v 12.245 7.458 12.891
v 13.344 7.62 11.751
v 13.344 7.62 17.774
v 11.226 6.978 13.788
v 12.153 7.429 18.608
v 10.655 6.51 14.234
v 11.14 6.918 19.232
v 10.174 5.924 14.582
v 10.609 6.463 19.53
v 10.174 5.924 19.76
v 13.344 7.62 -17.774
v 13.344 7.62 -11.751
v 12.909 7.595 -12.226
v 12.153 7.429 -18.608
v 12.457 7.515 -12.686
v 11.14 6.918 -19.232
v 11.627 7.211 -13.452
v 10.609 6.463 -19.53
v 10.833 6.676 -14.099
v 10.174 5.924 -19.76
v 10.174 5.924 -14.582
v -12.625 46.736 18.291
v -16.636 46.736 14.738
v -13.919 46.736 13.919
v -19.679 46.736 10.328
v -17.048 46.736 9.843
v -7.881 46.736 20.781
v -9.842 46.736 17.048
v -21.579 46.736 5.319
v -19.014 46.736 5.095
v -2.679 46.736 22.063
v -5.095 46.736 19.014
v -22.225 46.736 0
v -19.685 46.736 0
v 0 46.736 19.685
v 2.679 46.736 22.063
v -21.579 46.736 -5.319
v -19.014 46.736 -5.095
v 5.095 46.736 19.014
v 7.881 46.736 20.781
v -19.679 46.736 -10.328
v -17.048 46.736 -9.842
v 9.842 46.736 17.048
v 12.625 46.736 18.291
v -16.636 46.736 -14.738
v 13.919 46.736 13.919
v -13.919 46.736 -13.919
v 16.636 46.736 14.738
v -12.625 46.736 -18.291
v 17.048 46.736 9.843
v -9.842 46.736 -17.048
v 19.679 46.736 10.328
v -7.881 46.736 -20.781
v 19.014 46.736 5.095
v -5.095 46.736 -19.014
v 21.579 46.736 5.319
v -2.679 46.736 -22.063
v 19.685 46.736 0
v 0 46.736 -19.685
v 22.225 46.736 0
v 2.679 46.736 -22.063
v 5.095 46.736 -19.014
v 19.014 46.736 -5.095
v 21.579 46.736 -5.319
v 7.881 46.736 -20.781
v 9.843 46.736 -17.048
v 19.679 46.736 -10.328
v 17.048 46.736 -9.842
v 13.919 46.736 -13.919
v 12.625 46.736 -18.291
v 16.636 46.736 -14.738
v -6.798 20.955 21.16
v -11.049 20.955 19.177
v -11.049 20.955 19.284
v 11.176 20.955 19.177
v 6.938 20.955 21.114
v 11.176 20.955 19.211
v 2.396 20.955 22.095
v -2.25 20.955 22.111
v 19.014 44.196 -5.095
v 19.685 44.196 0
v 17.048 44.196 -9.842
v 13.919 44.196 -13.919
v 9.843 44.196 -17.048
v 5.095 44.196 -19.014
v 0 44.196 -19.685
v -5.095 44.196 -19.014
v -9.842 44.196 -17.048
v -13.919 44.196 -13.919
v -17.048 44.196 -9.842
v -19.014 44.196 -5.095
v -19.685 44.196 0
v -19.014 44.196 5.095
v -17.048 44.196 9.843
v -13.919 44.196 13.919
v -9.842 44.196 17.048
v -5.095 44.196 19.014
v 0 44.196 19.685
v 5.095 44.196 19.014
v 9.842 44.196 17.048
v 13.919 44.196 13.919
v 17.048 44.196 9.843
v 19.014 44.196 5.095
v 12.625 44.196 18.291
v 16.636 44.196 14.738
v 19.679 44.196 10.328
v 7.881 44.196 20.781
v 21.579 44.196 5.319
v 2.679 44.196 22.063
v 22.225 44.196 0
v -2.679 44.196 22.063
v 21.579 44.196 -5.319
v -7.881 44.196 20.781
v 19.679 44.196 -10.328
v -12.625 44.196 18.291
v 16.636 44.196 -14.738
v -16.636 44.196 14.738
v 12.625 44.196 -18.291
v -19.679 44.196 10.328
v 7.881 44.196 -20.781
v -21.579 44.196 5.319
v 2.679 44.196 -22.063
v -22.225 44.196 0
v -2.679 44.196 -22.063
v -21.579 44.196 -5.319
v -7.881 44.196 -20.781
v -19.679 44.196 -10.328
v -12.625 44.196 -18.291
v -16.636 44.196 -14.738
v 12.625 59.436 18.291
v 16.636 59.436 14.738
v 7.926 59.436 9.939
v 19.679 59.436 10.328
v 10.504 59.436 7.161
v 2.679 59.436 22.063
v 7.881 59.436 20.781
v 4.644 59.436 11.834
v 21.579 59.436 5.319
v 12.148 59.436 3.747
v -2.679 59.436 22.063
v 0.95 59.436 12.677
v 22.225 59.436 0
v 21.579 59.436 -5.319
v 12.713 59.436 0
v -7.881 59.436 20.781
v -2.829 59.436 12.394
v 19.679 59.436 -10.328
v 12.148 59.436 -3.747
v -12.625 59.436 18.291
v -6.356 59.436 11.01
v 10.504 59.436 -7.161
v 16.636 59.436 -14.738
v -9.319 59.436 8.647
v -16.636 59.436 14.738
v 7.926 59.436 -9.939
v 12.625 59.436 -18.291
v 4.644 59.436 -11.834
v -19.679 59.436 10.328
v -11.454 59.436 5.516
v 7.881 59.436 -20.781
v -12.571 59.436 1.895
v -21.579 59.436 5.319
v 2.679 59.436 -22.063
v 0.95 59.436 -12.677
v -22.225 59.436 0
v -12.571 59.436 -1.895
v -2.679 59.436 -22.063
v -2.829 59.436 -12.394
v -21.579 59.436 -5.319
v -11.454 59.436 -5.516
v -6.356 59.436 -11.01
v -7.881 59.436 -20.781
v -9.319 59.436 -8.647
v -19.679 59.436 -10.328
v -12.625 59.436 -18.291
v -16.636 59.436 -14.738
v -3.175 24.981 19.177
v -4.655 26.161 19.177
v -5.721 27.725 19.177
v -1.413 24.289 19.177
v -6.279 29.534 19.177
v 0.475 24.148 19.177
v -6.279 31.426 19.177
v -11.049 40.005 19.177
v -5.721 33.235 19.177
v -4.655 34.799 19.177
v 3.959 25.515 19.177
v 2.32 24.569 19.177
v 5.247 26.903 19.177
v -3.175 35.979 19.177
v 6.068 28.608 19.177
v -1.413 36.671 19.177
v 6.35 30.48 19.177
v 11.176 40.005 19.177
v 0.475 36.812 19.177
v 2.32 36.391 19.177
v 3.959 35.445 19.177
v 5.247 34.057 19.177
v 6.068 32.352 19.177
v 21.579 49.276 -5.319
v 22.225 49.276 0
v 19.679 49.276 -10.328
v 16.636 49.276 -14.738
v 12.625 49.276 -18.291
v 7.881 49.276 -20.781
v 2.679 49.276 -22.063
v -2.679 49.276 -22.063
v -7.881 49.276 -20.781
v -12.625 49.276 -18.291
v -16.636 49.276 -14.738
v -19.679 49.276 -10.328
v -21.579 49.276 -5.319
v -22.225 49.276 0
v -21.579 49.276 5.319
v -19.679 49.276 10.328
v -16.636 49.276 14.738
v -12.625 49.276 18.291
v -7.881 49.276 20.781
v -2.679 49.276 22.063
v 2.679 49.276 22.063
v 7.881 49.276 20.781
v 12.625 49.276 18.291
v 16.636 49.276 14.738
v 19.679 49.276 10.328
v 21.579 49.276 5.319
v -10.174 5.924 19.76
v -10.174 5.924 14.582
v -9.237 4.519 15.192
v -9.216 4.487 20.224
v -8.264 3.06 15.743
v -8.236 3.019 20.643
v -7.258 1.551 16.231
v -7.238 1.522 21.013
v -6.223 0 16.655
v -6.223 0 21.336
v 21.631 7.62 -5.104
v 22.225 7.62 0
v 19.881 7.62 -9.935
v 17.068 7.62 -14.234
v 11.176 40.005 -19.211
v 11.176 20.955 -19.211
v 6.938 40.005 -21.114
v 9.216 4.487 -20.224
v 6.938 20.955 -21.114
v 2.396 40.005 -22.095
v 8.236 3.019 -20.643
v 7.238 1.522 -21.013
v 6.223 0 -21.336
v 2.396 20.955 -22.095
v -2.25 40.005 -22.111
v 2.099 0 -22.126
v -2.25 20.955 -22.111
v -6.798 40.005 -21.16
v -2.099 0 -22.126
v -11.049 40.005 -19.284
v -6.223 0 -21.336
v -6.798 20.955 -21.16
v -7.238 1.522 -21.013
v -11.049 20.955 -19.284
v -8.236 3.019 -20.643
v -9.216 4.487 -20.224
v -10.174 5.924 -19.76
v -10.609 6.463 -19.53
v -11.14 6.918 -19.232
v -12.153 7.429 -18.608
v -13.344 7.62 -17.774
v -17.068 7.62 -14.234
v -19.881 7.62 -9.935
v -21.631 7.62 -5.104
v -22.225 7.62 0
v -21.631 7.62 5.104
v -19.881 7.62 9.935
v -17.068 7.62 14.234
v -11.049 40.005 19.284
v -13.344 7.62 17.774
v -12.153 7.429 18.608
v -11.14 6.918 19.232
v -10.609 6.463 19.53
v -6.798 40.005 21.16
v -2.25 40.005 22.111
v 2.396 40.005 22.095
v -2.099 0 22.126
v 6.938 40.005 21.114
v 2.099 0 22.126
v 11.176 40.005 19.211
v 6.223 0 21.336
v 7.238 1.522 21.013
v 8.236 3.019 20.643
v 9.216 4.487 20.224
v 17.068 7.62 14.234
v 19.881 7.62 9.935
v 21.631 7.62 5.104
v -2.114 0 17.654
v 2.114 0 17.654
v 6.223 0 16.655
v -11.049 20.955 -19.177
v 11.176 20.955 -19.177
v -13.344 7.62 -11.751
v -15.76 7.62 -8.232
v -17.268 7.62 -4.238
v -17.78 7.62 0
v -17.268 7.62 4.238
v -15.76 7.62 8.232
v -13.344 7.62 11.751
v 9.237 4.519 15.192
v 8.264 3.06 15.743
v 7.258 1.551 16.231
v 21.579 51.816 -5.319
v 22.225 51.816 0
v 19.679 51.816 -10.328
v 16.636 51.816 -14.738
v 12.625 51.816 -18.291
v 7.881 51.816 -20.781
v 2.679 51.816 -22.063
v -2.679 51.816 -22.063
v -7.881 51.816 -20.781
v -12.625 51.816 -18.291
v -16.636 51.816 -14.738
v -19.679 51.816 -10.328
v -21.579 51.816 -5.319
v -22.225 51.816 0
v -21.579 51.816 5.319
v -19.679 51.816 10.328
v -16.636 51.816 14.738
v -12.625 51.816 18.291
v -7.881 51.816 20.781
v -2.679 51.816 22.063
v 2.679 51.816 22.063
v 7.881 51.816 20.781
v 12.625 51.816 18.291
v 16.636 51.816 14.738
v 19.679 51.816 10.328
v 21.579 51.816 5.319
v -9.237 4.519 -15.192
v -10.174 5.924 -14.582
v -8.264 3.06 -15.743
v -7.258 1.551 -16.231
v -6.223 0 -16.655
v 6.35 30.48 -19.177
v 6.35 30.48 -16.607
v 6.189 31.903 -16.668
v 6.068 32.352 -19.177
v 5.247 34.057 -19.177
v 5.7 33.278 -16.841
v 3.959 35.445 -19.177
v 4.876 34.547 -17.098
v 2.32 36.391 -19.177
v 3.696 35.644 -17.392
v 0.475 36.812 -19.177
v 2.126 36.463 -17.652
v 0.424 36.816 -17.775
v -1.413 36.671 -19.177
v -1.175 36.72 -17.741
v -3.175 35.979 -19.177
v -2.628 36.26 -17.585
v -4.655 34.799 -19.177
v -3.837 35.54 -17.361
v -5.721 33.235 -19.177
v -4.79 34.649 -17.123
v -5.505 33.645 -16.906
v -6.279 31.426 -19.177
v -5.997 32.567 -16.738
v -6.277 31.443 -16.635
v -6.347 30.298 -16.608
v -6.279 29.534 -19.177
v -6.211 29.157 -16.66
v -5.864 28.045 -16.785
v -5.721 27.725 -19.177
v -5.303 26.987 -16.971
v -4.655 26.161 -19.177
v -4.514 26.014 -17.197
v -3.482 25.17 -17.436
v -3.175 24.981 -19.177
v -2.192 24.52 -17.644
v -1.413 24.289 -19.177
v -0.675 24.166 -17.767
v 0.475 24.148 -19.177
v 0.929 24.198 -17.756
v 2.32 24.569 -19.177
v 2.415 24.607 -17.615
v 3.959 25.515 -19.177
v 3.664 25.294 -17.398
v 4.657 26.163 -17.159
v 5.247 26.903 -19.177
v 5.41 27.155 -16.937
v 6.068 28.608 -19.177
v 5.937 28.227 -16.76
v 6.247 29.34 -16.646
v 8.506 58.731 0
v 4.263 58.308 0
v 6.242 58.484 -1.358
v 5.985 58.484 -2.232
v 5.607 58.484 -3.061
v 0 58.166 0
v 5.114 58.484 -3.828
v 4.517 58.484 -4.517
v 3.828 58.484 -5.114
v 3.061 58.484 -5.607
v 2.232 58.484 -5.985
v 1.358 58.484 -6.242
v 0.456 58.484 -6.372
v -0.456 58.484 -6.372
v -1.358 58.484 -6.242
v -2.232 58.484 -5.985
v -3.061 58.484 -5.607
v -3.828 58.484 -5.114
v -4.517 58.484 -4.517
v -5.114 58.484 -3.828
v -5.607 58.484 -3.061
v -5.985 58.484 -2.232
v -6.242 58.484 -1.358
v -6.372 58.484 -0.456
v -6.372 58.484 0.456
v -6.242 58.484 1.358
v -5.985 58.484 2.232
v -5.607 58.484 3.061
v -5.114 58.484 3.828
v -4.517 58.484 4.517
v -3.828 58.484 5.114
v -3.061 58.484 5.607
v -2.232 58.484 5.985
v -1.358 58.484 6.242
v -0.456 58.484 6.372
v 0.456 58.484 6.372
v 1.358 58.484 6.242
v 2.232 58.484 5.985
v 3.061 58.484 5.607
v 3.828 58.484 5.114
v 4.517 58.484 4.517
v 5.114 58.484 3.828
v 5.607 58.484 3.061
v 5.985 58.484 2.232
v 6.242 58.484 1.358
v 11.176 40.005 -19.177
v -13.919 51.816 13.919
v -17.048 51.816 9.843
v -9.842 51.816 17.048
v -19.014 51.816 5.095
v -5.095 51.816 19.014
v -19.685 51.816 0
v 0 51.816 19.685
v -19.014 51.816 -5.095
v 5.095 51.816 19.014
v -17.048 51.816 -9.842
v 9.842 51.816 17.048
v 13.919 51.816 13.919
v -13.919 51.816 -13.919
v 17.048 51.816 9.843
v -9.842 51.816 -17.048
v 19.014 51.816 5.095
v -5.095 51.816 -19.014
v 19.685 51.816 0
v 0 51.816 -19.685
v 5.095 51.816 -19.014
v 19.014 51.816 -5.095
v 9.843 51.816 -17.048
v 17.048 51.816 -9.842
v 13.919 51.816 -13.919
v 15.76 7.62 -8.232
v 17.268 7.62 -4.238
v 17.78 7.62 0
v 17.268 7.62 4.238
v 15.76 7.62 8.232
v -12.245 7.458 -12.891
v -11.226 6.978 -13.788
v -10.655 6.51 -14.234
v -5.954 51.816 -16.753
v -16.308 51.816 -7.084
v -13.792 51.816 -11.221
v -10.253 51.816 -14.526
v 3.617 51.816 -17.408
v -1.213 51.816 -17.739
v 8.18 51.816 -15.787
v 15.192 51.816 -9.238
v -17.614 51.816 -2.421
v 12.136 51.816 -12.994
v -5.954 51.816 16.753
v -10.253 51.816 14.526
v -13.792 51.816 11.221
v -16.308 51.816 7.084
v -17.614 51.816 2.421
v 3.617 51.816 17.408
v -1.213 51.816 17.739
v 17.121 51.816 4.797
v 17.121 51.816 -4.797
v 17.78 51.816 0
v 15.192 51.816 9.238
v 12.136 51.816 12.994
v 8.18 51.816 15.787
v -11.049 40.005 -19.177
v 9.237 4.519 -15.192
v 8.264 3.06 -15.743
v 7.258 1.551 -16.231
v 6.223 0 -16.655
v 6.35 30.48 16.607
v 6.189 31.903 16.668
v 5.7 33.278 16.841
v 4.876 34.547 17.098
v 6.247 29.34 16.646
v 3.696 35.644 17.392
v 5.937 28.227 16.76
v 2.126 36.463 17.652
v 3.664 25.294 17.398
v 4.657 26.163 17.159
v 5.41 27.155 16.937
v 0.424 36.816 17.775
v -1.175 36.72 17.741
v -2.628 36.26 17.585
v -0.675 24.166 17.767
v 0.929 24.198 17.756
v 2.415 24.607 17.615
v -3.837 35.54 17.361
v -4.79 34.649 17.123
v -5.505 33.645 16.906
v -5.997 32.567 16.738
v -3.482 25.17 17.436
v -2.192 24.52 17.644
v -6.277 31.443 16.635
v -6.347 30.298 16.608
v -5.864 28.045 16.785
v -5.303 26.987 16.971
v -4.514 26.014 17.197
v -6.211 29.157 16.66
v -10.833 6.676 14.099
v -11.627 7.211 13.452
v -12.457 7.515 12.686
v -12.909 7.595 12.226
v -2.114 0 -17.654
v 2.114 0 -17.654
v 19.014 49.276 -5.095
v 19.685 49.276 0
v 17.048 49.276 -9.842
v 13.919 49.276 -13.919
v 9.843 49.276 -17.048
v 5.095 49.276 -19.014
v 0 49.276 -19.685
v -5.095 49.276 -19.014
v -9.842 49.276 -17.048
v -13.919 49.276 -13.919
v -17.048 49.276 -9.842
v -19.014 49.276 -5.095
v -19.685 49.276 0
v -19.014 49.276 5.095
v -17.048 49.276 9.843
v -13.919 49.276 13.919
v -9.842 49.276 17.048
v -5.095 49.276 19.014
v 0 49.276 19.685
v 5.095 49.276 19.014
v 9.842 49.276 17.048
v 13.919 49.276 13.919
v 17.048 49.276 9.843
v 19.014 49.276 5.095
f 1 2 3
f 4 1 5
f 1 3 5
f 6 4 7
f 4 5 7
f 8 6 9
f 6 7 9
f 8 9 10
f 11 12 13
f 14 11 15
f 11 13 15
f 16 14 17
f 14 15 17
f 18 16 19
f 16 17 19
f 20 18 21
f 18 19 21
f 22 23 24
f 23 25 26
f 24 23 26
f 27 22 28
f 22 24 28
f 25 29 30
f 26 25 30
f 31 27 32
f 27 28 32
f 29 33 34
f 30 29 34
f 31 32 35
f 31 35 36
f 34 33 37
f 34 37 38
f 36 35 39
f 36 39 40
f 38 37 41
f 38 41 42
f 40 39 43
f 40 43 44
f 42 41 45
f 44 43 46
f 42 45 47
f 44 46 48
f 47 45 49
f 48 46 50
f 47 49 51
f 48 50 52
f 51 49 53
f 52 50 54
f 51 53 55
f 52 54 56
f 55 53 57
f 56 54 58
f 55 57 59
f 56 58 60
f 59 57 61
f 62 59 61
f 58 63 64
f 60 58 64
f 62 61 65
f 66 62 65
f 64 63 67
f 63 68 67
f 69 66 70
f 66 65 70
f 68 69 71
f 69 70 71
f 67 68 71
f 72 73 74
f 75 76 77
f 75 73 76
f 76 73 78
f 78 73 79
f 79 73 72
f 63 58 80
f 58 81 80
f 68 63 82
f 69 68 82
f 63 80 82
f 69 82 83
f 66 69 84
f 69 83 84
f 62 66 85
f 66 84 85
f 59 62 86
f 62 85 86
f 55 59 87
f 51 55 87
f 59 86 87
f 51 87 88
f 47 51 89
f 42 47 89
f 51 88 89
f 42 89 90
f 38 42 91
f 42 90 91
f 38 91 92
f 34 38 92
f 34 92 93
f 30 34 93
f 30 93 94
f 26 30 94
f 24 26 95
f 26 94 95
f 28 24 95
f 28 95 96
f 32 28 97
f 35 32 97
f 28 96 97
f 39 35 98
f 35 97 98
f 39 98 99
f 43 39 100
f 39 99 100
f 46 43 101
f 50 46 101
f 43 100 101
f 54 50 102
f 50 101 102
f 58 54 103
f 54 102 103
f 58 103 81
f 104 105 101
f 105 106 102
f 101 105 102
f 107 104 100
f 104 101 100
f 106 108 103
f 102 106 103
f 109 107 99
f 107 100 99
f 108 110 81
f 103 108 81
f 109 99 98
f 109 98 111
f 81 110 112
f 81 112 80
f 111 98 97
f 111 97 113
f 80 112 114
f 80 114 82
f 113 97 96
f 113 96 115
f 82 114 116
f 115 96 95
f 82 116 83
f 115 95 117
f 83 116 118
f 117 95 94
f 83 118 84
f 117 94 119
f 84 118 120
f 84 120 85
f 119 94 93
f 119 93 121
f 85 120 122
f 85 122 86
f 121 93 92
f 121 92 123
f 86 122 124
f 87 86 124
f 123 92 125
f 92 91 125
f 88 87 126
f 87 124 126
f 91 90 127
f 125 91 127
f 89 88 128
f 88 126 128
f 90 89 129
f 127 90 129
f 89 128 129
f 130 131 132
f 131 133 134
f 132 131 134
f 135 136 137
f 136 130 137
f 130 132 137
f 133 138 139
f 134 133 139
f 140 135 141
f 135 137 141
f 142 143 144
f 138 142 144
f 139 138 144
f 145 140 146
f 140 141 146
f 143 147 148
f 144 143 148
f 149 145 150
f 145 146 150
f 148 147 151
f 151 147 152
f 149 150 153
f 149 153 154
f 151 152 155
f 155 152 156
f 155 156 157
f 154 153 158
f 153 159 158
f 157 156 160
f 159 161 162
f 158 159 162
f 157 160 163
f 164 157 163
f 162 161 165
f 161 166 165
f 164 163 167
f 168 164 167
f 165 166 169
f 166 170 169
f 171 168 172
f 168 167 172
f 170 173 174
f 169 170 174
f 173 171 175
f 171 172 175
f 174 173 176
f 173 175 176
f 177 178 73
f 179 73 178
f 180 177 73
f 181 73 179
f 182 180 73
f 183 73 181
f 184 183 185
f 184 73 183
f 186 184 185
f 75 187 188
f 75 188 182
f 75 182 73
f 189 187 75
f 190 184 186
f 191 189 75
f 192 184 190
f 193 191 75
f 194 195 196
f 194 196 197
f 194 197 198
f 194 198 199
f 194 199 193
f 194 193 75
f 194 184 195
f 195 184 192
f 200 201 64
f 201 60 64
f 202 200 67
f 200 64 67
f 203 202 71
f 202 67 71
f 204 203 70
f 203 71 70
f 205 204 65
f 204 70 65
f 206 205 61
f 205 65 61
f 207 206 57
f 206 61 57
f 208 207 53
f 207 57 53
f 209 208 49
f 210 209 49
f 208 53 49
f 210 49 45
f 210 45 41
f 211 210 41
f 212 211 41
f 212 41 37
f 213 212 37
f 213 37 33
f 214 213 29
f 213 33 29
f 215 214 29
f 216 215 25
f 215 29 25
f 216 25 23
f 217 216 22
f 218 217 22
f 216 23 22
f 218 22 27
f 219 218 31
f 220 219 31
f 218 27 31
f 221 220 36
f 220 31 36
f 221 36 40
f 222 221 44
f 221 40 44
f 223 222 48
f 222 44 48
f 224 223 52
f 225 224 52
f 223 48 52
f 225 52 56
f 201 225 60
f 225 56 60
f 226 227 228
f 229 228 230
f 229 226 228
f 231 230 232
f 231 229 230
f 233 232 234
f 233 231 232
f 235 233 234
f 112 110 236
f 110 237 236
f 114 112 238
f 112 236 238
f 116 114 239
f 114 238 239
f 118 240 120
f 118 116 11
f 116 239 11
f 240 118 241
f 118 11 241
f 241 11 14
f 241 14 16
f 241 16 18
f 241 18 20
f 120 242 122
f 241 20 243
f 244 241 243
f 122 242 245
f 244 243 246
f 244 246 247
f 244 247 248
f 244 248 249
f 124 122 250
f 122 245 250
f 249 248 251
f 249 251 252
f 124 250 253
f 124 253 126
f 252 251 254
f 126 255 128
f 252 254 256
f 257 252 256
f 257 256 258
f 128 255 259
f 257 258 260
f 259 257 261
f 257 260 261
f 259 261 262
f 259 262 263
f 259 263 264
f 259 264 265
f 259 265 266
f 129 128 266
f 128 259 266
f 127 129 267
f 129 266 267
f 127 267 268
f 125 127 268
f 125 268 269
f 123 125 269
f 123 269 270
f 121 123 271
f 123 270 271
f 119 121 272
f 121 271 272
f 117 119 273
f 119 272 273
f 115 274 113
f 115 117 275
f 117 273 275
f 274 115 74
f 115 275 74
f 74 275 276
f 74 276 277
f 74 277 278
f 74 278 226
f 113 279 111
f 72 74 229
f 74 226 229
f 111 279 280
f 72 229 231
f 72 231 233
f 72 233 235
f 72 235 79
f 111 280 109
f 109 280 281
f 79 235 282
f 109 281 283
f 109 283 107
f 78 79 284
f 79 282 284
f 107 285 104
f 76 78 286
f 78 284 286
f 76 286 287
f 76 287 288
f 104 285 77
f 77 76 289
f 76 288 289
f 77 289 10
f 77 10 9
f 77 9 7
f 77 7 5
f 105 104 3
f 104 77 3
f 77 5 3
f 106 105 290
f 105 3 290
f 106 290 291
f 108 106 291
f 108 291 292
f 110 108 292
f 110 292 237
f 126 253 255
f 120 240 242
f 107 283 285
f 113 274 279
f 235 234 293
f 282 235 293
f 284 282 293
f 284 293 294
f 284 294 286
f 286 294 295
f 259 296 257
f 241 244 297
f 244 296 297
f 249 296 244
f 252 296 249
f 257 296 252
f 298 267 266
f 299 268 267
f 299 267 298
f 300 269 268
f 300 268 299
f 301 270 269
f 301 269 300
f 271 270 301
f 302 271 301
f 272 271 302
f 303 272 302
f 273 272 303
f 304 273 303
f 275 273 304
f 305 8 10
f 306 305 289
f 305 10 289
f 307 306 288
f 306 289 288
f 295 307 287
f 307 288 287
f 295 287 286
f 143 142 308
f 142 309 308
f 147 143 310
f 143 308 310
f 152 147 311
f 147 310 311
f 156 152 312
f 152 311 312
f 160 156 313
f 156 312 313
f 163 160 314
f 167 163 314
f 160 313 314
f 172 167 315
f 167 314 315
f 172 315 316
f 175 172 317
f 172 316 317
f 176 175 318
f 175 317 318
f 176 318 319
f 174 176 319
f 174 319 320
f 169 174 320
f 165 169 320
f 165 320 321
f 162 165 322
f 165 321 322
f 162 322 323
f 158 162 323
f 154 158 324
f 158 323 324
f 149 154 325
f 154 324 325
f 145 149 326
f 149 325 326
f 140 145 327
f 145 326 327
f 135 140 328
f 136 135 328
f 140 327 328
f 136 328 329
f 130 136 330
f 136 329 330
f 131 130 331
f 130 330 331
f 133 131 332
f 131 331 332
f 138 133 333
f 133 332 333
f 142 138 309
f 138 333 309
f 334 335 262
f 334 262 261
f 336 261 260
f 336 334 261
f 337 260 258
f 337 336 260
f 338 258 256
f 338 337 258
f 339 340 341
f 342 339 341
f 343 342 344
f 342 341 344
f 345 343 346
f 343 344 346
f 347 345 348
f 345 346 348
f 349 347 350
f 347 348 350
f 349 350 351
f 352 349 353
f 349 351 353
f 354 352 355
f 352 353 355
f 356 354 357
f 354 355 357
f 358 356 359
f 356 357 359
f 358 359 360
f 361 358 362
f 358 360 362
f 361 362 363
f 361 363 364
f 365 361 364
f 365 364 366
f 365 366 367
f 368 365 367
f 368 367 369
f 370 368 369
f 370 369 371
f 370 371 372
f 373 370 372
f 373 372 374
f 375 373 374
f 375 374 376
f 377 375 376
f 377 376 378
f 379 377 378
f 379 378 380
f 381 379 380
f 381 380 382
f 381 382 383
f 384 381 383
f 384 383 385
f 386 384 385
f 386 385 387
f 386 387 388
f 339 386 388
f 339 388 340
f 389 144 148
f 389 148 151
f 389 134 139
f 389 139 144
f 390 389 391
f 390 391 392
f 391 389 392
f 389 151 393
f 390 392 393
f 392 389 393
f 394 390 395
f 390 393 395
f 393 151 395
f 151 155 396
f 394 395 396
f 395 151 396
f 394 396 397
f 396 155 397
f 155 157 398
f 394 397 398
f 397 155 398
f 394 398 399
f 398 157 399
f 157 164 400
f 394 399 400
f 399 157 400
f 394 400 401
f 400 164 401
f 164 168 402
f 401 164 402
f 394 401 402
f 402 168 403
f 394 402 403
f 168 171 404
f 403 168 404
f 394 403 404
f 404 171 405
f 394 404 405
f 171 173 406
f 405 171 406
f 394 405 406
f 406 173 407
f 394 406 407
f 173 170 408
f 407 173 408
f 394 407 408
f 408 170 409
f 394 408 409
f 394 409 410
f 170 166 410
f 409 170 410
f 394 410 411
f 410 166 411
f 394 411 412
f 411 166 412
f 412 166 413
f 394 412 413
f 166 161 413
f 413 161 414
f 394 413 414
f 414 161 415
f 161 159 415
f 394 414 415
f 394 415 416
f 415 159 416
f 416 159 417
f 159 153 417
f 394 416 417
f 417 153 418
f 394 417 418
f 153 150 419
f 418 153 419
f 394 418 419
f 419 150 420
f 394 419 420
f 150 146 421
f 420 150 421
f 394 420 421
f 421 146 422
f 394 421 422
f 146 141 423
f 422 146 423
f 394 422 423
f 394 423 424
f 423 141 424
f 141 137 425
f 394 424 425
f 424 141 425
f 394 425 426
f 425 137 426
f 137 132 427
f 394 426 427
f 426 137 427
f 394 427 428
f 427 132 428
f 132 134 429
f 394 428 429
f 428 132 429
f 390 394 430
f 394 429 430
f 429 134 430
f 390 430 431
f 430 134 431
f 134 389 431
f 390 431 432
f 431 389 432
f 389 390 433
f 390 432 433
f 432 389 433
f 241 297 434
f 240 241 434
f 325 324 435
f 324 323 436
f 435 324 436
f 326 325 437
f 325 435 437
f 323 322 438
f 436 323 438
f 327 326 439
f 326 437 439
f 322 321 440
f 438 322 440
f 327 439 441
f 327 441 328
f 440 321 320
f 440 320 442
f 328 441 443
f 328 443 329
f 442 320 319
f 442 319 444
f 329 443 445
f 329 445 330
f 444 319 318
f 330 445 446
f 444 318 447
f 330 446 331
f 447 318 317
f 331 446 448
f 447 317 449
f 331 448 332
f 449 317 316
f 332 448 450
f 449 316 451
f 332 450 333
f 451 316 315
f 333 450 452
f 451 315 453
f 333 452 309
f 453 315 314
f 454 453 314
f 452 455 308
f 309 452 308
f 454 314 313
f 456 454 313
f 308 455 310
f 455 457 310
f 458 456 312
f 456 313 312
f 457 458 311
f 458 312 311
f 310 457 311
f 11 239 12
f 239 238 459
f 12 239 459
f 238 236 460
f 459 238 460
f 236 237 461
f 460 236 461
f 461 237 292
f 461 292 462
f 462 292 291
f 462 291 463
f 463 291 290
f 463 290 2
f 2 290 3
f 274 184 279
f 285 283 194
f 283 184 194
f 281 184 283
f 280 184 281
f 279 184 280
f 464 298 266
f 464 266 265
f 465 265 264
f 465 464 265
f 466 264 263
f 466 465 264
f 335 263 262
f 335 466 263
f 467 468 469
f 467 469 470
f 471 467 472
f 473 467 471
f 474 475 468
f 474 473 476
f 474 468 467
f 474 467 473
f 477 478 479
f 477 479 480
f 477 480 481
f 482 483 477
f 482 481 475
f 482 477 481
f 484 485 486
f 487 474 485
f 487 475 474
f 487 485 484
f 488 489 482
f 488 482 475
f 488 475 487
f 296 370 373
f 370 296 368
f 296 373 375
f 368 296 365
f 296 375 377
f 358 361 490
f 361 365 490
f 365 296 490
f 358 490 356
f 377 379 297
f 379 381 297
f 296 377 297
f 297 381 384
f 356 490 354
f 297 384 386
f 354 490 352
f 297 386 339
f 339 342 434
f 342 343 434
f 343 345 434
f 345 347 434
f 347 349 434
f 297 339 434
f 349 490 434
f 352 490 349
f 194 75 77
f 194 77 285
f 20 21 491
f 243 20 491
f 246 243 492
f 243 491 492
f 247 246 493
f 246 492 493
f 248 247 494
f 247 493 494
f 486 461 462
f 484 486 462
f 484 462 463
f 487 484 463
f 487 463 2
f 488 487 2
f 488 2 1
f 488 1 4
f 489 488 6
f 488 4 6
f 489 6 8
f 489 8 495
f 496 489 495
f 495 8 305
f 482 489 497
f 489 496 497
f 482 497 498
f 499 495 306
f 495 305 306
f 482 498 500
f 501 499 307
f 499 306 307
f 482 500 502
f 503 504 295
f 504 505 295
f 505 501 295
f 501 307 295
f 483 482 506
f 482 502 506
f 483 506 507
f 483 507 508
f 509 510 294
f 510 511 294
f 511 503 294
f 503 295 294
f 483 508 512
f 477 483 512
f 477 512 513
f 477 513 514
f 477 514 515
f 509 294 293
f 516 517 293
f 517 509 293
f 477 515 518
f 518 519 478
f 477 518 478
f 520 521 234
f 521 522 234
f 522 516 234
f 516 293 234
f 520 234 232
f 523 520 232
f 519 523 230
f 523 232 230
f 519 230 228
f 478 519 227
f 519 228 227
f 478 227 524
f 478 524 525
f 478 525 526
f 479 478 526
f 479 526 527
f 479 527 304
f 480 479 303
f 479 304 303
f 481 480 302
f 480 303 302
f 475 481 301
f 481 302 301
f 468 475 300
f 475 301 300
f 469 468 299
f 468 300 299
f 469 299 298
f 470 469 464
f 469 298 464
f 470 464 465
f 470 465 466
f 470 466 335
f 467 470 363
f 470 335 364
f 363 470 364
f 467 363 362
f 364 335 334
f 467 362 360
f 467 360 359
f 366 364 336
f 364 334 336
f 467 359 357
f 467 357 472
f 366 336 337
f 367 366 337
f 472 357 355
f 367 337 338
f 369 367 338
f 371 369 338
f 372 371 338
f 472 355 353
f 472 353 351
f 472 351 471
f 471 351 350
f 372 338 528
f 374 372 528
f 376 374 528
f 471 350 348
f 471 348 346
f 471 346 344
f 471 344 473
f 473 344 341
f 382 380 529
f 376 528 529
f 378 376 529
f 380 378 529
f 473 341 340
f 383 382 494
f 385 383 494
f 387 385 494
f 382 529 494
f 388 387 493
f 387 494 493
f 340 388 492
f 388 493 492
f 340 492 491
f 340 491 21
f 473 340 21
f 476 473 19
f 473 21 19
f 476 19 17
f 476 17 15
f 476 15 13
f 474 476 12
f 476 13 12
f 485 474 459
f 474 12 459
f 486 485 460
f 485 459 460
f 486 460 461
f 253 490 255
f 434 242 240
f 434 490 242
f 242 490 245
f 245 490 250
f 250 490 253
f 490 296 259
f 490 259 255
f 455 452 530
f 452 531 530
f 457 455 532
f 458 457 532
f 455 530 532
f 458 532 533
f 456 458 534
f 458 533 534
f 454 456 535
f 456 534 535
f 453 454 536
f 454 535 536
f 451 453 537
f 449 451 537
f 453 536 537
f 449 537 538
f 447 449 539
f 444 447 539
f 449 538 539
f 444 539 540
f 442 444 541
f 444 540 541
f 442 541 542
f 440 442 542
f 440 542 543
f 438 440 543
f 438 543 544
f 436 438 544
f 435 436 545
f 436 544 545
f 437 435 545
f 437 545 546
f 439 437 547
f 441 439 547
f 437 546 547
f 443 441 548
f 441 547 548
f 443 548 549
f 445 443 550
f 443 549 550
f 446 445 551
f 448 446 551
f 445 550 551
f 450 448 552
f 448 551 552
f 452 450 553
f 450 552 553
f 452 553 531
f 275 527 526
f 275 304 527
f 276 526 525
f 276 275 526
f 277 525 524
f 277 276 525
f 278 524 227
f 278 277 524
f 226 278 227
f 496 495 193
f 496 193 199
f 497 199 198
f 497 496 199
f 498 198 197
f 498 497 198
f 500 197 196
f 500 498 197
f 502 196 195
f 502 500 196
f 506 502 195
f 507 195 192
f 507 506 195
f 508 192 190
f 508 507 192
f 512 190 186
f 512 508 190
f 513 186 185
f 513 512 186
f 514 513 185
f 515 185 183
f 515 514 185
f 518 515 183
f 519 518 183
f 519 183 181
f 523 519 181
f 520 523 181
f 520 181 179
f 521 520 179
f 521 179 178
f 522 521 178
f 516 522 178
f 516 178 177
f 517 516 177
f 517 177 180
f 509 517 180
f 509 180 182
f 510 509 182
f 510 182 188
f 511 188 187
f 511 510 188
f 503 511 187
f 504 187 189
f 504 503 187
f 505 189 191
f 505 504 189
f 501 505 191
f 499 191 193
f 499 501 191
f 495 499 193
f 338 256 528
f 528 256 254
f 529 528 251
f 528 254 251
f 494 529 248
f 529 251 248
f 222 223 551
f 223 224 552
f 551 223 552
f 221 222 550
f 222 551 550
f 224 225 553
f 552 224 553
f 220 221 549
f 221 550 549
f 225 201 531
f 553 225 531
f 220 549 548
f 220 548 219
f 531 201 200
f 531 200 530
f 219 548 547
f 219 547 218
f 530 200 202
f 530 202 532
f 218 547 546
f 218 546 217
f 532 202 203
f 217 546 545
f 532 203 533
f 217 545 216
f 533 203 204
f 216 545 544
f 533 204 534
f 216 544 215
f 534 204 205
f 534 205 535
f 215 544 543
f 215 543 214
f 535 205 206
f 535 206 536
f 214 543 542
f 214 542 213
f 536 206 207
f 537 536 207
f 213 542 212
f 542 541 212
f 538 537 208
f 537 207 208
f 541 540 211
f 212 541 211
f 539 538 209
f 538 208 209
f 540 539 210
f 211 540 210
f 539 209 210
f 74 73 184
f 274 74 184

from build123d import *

# Parameters (mm, degrees)
SKETCH2_R               = 17.78
CUT_EXTRUDE1_DEPTH      = 51.816
SKETCH3_R               = 6.35
CUT_EXTRUDE2_DEPTH      = 23.225
CUT_EXTRUDE2_DEPTH_BACK = 23.225
CUT_EXTRUDE3_START      = 19.177
SKETCH4_W               = 22.225
SKETCH4_H               = 19.05
CUT_EXTRUDE3_DEPTH      = 4.0480001
CUT_EXTRUDE4_DEPTH      = 23.225


with BuildPart() as part:
    # Sketch1 → Revolve1 (revolve)
    with BuildSketch(Plane.XY):
        with BuildLine():
            Line((0, 0), (0, 58.166))
            ThreePointArc((0, 58.166), (6.387986381, 58.484288237), (12.712693656, 59.436))
            Line((12.712693656, 59.436), (22.225, 59.436))
            Line((22.225, 59.436), (22.225, 51.816))
            Line((22.225, 51.816), (19.685, 51.816))
            Line((19.685, 51.816), (19.685, 49.276))
            Line((19.685, 49.276), (22.225, 49.276))
            Line((22.225, 49.276), (22.225, 46.736))
            Line((22.225, 46.736), (19.685, 46.736))
            Line((19.685, 46.736), (19.685, 44.196))
            Line((19.685, 44.196), (22.225, 44.196))
            Line((22.225, 44.196), (22.225, 0))
            Line((22.225, 0), (0, 0))
        make_face()
    revolve(axis=Axis((0, 0, 0), (0, 1, 0)))

    # Sketch2 → Cut-Extrude1 (cut)
    with BuildSketch(Plane.XZ):
        Circle(SKETCH2_R)
    extrude(amount=-CUT_EXTRUDE1_DEPTH, mode=Mode.SUBTRACT)

    # Sketch3 → Cut-Extrude2 (cut, two sides)
    with BuildSketch(Plane.XY) as cut_extrude2_sk:
        with Locations((0, 30.48)):
            Circle(SKETCH3_R)
    extrude(amount=CUT_EXTRUDE2_DEPTH, mode=Mode.SUBTRACT)
    extrude(cut_extrude2_sk.sketch, amount=-CUT_EXTRUDE2_DEPTH_BACK, mode=Mode.SUBTRACT)

    # Sketch4 → Cut-Extrude3 (cut, through all)
    with BuildSketch(Plane.XY.offset(CUT_EXTRUDE3_START)):
        with Locations((0.0635, 30.48)):
            Rectangle(SKETCH4_W, SKETCH4_H)
    cut_extrude3 = extrude(amount=CUT_EXTRUDE3_DEPTH, mode=Mode.SUBTRACT)

    # Mirror1: Cut-Extrude3 across plane
    add(cut_extrude3.mirror(Plane.XY), mode=Mode.SUBTRACT)

    # Sketch5 → Cut-Extrude4 (cut, symmetric)
    with BuildSketch(Plane.XY):
        with BuildLine():
            Line((22.225, 0), (22.225, 7.62))
            Line((22.225, 7.62), (13.343533586, 7.62))
            ThreePointArc((13.343533586, 7.62), (11.546046061, 7.169336035), (10.173788381, 5.923957269))
            Line((10.173788381, 5.923957269), (6.223, 0))
            Line((6.223, 0), (22.225, 0))
        make_face()
    cut_extrude4 = extrude(amount=CUT_EXTRUDE4_DEPTH, both=True, mode=Mode.SUBTRACT)

    # Mirror2: Cut-Extrude4 across plane
    add(cut_extrude4.mirror(Plane(origin=(0, 0, 0), x_dir=(0, 0, 1), z_dir=(1, 0, 0))), mode=Mode.SUBTRACT)


solid = part.part
